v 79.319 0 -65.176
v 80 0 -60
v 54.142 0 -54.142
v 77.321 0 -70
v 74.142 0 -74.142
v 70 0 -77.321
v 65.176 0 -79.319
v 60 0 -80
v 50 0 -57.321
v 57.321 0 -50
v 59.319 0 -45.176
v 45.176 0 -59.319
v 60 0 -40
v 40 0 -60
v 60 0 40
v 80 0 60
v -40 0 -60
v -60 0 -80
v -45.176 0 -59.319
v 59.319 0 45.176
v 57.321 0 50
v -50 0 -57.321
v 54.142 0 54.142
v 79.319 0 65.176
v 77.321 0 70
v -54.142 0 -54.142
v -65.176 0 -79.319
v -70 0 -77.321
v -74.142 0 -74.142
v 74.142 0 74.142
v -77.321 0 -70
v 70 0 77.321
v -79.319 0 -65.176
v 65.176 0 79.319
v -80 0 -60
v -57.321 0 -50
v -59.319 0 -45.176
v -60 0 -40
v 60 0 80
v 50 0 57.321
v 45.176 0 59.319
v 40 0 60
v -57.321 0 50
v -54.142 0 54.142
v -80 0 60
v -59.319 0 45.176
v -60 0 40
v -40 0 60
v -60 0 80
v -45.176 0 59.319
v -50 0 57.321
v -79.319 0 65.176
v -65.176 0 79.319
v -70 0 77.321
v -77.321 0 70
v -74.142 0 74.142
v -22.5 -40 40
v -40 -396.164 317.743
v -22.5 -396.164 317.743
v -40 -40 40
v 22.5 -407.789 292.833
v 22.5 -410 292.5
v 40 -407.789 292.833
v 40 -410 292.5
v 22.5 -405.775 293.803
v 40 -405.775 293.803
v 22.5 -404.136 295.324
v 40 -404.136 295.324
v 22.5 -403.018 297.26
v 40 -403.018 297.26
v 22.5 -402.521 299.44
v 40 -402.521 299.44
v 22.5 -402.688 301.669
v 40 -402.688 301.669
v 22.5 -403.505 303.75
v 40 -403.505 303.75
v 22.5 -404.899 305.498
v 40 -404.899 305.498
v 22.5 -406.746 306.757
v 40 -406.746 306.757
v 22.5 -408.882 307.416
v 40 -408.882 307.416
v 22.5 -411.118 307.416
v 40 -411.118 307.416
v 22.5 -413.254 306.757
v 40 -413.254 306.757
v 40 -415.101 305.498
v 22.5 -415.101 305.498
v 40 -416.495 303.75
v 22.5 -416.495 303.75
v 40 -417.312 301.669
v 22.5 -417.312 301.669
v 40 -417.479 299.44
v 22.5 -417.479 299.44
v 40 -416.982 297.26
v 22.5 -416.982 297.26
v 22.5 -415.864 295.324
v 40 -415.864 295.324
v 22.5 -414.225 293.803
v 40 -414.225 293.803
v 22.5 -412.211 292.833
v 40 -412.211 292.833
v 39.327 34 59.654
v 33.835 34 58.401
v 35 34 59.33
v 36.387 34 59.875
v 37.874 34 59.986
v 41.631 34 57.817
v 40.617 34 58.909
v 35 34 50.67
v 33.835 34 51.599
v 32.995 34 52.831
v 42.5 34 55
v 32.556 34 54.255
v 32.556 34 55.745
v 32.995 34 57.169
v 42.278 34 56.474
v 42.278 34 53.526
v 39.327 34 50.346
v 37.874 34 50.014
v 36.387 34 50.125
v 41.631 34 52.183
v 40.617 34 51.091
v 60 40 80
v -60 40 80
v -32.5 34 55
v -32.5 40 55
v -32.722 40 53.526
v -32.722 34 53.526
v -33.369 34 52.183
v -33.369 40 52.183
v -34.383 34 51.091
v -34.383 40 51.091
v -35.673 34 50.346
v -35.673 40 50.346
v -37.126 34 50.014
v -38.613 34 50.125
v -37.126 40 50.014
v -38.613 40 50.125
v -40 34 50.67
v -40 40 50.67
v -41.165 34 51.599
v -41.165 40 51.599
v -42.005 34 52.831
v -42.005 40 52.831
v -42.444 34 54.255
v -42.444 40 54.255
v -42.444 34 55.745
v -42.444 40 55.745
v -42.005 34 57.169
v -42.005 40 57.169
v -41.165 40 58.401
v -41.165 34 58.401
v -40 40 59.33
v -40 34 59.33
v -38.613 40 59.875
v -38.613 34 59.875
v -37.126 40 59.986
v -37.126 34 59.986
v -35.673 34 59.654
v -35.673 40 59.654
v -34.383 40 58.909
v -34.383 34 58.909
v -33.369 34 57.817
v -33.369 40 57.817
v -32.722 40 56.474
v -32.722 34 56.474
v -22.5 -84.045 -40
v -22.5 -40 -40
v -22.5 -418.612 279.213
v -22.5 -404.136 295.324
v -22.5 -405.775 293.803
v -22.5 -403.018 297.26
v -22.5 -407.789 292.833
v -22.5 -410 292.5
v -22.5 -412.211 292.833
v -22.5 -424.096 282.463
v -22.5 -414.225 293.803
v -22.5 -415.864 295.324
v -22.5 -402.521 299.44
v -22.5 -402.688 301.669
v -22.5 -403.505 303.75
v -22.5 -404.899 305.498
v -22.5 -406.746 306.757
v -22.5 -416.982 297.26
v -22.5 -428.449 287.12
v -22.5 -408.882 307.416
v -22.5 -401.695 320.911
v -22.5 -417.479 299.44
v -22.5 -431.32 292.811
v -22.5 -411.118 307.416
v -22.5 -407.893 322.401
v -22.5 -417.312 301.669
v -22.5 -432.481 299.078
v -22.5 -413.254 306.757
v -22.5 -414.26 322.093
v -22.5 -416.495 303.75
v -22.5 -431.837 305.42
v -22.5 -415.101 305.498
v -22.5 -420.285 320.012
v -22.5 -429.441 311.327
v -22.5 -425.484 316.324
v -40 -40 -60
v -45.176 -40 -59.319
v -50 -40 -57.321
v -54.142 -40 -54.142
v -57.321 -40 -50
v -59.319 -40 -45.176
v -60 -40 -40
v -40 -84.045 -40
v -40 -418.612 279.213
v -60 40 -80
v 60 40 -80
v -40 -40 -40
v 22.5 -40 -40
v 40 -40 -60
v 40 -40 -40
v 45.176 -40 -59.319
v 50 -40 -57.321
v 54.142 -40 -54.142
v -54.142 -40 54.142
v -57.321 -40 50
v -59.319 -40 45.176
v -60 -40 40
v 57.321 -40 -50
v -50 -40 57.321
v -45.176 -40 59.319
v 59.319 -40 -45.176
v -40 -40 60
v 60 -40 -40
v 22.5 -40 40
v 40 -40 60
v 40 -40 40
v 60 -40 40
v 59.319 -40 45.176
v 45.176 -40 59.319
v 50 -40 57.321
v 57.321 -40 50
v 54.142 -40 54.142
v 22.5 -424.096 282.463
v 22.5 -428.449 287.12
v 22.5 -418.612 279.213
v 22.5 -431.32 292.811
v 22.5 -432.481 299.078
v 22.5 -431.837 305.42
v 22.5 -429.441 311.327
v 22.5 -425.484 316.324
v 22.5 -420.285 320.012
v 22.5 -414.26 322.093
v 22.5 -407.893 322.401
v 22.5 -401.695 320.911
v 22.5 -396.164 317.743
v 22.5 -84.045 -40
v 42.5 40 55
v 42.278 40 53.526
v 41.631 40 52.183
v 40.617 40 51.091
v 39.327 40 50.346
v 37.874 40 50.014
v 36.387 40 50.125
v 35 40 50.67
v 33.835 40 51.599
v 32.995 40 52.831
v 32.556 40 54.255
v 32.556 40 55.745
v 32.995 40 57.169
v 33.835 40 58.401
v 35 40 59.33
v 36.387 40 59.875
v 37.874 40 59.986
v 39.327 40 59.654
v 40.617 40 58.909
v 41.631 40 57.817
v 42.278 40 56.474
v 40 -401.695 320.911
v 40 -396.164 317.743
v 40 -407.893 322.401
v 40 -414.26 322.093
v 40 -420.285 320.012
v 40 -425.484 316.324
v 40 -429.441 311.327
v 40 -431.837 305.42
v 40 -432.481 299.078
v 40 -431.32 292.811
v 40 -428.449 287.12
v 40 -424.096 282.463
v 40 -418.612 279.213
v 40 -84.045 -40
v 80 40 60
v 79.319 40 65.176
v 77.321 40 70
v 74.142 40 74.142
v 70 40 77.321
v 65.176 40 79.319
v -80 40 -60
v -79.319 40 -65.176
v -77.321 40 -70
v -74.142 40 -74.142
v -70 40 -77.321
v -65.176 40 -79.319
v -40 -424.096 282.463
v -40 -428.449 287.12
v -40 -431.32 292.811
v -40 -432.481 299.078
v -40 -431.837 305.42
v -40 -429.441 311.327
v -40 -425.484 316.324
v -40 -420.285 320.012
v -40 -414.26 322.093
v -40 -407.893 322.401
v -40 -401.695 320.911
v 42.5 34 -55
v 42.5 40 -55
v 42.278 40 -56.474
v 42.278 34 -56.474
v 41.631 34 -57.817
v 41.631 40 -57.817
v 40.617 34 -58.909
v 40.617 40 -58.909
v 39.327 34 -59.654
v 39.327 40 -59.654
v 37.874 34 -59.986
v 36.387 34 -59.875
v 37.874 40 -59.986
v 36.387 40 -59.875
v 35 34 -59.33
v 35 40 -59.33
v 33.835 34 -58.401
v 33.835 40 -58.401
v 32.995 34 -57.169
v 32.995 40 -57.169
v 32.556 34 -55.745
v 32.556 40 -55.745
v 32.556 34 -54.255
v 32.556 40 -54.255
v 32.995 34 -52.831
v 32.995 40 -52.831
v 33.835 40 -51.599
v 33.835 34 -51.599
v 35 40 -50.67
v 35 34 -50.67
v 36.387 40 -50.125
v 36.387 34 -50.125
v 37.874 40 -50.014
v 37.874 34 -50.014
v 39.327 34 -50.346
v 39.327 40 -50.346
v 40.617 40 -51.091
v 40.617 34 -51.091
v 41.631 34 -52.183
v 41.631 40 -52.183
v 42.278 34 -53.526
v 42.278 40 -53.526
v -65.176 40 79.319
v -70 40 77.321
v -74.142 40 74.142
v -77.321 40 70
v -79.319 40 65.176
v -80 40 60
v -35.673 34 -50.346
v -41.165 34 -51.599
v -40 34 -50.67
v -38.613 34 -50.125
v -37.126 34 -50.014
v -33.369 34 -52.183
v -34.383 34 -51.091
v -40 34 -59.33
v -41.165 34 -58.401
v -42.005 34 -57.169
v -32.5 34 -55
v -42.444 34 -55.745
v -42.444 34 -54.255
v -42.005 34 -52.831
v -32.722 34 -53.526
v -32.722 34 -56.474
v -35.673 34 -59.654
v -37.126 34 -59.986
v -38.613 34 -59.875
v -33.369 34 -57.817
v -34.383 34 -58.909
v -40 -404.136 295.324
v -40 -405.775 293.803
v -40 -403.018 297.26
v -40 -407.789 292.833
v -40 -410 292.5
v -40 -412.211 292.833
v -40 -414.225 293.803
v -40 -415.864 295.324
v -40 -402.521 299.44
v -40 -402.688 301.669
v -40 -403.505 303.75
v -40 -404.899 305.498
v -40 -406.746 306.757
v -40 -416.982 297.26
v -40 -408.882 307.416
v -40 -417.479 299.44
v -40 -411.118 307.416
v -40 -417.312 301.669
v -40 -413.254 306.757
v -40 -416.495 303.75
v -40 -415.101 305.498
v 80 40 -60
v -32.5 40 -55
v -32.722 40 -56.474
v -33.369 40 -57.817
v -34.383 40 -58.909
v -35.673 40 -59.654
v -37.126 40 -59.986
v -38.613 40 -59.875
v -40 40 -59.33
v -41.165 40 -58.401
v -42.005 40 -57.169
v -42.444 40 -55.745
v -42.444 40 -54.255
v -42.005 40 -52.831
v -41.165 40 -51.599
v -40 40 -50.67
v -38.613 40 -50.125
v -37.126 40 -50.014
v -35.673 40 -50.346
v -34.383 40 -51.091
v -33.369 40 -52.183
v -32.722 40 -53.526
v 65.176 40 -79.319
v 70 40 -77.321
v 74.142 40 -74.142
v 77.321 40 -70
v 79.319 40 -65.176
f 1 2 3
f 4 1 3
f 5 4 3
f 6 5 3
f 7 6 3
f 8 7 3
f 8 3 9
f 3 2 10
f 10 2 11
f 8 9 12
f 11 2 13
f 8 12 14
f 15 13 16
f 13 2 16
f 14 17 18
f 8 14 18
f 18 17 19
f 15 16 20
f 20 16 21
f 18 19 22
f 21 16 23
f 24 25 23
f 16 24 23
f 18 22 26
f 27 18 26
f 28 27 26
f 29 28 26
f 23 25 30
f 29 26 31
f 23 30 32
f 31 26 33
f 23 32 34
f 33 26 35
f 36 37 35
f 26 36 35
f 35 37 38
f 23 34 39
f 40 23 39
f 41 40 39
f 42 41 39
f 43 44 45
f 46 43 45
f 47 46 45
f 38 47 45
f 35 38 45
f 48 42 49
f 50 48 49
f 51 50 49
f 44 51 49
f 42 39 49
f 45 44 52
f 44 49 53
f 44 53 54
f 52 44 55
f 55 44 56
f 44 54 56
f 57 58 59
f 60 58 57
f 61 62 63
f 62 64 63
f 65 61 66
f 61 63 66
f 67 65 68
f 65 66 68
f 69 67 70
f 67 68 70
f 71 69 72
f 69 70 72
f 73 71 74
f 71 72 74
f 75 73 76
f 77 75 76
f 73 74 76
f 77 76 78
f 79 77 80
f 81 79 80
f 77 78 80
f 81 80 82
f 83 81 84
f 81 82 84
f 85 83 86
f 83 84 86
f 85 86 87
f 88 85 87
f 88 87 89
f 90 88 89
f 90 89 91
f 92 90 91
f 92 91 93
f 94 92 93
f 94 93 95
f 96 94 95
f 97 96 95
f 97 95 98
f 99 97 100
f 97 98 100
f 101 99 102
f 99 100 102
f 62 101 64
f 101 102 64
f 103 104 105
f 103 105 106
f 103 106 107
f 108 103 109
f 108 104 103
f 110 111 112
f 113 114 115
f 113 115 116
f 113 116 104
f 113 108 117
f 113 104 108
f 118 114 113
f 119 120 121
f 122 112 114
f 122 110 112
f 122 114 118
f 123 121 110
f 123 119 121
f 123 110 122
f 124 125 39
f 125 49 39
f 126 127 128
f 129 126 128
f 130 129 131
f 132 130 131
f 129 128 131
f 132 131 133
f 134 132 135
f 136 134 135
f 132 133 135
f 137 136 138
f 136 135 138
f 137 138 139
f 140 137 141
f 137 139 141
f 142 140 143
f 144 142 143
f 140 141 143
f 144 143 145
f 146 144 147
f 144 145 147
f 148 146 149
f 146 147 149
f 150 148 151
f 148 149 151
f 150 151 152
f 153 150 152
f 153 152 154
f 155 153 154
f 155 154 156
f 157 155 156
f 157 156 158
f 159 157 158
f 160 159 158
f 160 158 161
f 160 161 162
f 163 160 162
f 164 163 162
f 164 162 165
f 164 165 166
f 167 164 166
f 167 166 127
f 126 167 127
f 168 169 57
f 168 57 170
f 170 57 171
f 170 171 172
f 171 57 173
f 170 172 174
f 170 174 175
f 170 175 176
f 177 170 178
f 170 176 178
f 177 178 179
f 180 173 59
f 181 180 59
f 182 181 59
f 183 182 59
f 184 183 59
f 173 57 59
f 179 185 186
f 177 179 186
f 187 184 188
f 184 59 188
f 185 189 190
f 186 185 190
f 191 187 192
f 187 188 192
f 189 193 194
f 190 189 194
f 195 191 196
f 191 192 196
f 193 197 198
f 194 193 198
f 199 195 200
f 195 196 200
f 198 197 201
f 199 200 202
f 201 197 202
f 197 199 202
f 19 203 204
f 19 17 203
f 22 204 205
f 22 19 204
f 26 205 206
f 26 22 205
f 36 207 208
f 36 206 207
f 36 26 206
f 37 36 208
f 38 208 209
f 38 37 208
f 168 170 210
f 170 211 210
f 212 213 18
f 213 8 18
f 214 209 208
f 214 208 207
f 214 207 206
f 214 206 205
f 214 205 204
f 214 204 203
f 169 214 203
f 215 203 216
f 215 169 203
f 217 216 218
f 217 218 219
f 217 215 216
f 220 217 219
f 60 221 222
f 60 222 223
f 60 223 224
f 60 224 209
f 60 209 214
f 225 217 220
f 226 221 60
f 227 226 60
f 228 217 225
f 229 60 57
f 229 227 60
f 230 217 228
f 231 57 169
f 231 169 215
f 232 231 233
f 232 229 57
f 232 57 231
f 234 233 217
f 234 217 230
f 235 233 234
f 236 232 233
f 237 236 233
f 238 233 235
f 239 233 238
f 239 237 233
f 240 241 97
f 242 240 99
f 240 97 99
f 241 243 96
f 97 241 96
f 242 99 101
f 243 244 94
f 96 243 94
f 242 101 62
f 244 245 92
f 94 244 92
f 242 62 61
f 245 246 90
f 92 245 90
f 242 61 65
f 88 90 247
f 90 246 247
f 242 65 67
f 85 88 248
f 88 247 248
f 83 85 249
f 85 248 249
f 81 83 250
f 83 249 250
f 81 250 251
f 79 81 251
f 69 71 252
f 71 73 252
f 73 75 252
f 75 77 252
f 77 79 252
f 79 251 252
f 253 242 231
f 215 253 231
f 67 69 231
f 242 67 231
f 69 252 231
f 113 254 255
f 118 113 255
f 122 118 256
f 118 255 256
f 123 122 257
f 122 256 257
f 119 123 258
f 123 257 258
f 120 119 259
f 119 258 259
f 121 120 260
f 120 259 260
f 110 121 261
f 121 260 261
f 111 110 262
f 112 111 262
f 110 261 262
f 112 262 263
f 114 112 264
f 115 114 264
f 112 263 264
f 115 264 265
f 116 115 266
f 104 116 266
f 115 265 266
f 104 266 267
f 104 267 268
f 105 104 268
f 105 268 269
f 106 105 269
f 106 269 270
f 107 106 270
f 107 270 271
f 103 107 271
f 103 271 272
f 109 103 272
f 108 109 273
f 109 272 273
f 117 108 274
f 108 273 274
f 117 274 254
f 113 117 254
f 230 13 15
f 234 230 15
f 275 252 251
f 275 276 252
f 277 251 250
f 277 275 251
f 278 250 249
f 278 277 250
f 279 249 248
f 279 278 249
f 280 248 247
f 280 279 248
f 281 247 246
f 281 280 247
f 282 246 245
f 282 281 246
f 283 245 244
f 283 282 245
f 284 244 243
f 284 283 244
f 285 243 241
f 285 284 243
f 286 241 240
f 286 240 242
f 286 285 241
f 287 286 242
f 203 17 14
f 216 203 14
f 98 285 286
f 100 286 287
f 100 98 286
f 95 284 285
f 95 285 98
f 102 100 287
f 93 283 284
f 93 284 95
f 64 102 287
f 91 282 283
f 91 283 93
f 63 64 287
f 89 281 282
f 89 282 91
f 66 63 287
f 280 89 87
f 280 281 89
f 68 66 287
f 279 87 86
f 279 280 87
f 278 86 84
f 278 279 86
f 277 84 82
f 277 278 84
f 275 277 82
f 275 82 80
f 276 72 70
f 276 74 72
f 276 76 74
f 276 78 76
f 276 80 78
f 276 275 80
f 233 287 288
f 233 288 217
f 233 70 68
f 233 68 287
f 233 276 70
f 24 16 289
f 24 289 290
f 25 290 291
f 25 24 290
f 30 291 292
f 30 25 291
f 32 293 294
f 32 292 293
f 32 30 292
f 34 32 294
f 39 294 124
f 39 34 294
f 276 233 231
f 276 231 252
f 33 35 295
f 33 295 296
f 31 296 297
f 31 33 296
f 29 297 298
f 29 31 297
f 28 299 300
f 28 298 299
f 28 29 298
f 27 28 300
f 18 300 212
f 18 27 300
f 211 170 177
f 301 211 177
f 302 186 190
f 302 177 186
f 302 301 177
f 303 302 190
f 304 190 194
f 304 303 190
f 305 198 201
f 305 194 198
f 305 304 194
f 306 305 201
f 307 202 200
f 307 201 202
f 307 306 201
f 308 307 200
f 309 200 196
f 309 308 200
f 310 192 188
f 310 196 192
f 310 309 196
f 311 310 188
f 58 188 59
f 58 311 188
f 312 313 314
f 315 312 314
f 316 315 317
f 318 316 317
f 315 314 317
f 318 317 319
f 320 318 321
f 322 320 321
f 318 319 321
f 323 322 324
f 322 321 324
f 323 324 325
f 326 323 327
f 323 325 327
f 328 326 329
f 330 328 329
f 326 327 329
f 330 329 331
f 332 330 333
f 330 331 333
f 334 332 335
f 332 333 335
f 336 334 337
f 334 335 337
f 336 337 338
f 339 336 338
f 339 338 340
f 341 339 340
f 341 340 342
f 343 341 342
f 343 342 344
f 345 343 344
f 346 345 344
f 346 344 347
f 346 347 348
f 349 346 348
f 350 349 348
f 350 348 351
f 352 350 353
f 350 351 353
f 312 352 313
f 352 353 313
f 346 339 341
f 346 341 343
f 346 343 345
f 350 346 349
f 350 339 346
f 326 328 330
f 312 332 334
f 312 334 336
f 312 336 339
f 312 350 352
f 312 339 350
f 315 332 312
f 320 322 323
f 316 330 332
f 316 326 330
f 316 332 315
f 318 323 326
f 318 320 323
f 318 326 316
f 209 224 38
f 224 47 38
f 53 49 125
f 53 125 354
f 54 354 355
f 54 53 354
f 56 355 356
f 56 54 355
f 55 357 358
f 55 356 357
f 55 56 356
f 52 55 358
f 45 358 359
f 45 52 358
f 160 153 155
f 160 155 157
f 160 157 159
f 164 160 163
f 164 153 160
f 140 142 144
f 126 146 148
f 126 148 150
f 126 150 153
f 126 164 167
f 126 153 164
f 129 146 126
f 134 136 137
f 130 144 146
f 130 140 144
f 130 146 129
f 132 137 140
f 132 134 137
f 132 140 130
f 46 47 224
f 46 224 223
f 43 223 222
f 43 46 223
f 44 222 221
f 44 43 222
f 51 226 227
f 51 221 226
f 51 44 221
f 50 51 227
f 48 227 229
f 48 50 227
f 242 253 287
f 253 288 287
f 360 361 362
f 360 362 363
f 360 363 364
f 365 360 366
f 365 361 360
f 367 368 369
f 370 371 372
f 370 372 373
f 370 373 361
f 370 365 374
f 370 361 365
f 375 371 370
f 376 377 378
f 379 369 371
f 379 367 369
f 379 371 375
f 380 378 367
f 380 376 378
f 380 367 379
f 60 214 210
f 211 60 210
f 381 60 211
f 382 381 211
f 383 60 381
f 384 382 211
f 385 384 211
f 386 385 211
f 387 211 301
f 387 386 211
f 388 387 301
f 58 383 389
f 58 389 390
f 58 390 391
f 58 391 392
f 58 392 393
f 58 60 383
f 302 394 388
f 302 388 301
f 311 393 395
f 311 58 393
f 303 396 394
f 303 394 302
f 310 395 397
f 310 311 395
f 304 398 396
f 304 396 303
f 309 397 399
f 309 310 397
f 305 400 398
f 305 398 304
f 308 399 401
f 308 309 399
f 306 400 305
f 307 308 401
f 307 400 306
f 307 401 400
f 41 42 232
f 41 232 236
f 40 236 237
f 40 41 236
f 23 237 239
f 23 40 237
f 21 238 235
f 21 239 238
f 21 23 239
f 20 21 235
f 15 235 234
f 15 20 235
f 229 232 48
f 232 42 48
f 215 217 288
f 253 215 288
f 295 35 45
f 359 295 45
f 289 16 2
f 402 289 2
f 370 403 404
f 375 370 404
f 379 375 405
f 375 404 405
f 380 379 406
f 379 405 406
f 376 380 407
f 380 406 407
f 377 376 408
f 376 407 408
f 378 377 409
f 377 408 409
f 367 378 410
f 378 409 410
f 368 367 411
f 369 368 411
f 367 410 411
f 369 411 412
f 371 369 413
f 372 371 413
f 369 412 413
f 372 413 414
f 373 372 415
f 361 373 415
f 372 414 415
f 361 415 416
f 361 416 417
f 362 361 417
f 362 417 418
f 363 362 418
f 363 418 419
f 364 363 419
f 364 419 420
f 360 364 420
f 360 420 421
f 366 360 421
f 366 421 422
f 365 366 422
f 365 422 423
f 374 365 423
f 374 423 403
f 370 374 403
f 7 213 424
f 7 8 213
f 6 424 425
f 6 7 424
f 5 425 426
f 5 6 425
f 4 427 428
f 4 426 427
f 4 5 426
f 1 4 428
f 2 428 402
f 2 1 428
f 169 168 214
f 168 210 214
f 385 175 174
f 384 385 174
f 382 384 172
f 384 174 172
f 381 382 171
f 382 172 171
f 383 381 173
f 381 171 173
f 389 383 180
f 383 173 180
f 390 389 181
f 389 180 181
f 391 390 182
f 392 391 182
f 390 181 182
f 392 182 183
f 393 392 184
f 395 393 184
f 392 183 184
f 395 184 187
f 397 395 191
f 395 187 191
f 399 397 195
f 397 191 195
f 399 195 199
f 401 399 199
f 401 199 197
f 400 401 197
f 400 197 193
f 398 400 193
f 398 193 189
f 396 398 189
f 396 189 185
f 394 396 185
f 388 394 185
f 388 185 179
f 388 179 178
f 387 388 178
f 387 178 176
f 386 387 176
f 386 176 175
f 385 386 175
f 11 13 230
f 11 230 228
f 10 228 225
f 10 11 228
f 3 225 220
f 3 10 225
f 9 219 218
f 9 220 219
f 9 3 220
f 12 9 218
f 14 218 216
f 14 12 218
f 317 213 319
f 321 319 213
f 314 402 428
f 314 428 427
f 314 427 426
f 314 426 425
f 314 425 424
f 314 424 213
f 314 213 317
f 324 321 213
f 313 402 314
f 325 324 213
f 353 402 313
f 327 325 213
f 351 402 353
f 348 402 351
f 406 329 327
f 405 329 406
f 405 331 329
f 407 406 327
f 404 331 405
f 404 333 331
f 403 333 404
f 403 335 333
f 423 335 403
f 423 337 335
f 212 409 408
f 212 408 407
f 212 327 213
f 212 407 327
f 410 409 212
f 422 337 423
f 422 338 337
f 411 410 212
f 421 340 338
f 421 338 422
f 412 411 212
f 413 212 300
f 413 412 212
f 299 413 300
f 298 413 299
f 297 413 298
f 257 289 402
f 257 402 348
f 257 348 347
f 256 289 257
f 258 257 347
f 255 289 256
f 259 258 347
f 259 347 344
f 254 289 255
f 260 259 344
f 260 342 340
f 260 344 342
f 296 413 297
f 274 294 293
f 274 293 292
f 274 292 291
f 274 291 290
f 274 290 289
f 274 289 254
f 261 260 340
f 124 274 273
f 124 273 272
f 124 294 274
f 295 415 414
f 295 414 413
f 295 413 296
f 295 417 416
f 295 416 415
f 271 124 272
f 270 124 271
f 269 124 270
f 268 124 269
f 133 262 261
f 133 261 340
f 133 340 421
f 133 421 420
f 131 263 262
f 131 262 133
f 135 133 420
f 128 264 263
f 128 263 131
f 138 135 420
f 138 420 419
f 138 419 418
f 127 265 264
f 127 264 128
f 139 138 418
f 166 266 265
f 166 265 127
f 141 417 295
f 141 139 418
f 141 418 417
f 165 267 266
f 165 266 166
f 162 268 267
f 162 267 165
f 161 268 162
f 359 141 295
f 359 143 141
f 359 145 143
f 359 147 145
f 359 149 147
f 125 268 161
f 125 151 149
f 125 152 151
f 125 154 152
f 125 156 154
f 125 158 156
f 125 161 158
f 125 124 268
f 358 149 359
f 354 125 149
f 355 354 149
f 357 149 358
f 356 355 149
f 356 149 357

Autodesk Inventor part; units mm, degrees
ref_plane "XZ Plane" through (0, 0, 0) normal (0, 1, 0) x (-1, 0, 0)
ref_plane "XY Plane" through (0, 0, 0) normal (0, 0, 1) x (1, 0, 0)
sketch "Sketch1" plane through (0, 0, 0) normal (0, 1, 0) x (-1, 0, 0)
  line L0 (-60, -80) -> (60, -80)
  line L1 (80, -60) -> (80, 60)
  line L2 (60, 80) -> (-60, 80)
  line L3 (-80, 60) -> (-80, -60)
  line L4 (-80, -80) -> (80, 80) construction
  line L5 (80, -80) -> (-80, 80) construction
  arc A0 (80, 60) -> (60, 80) centre (60, 60) ccw
  arc A1 (-60, 80) -> (-80, 60) centre (-60, 60) ccw
  arc A2 (-80, -60) -> (-60, -80) centre (-60, -60) ccw
  arc A3 (60, -80) -> (80, -60) centre (60, -60) ccw
  point P0 (0, 0)
  dimension "d0" = 160
  dimension "d1" = 160
  dimension "d2" = 20
extrude "Extrusion1" add sketch "Sketch1" along normal blind 40
sketch "Sketch2" plane through (0, 0, 0) normal (0, -1, 0) x (1, 0, 0)
  line L0 (-55, -52.5) -> (55, 52.5) construction
  line L1 (55, -52.5) -> (-55, 52.5) construction
  line L2 (90.8825, 0) -> (-87.3629, 0)
  line L3 (0, 94.4084) -> (0, -106.3516)
  line L4 (-40, -60) -> (40, -60)
  line L5 (60, -40) -> (60, 40)
  line L6 (40, 60) -> (-40, 60)
  line L7 (-60, 40) -> (-60, -40)
  line L8 (-60, -60) -> (60, 60) construction
  line L9 (60, -60) -> (-60, 60) construction
  line L10 (60, 60) -> (41.9971, 60)
  line L11 (60, -60) -> (41.9971, -60)
  line L12 (60, 60) -> (60, 71.6594)
  line L13 (60, -60) -> (60, -69.6689)
  arc A0 (60, 40) -> (40, 60) centre (40, 40) ccw
  arc A1 (-40, 60) -> (-60, 40) centre (-40, 40) ccw
  arc A2 (-60, -40) -> (-40, -60) centre (-40, -40) ccw
  arc A3 (40, -60) -> (60, -40) centre (40, -40) ccw
  point P0 (0, 0)
  dimension "d23" = 60
  dimension "d25" = 60
  dimension "d26" = 20
extrude "Extrusion2" add sketch "Sketch2" along normal blind 40
sketch "Sketch3" plane through (0, 40, 0) normal (0, 1, 0) x (1, 0, 0)
  circle A0 centre (-37.5, -55) radius 5
  circle A1 centre (37.5, -55) radius 5
  line L0 (-35.6722, 52.5) -> (-19.5402, 52.5)
  line L1 (0, 83.5001) -> (0, -85.7722)
  line L2 (-75.2069, 0) -> (80.66, 0)
  line L3 (-37.5, -55) -> (37.5, -55)
  line L4 (-37.5, -55) -> (-37.5, -56.2391)
  line L5 (37.5, -55) -> (37.5, -56.2391)
  circle A2 centre (-37.5, 55) radius 5
  circle A3 centre (37.5, 55) radius 5
  point P0 (0, 0)
  dimension "d15" = 37.5
  dimension "d16" = 37.5
  dimension "d17" = 55
  dimension "d20" = 10
  dimension "d21" = 10
extrude "Extrusion3" cut sketch "Sketch3" against normal blind 6
ref_plane "Work Plane1" through (40, 0, 0) normal (1, 0, 0) x (0, 1, 0)
sketch "Sketch4" plane through (40, 0, 0) normal (1, 0, 0) x (0, 1, 0)
  arc A0 (-396.1638, 317.7429) -> (-418.612, 279.2134) centre (-410, 300) ccw
  circle A1 centre (-410, 300) radius 300
  line L0 (-40, -40) -> (-40, 40) projected
  line L1 (40, 60) -> (40, -60) projected
  line L2 (63.9503, 0) -> (-247.3631, 0)
  line L3 (-410, 300) -> (-214.4005, 300)
  line L4 (-40, -40) -> (-84.0453, -40)
  line L5 (-40, 40) -> (-40, -40)
  line L6 (-40, 40) -> (-396.1638, 317.7429)
  line L7 (-84.0453, -40) -> (-418.612, 279.2134)
  point P0 (0, 0)
  point P1 (-131.6551, 40.5657)
  dimension "d28" = 45
  dimension "d29" = 600
  dimension "d30" = 450
  dimension "d31" = 300
extrude "Extrusion4" add sketch "Sketch4" against normal blind 17.5 contours L6 A1 L7 A0 | A1 L6 L0 L2 L7 | L2 L0 L4 L7 picked at (-333.3289, 219.1483)
mirror "Mirror1" about plane through (0, 0, 0) normal (1, 0, 0) of "Extrusion4"
sketch "Sketch5" plane through (60, 0, 40) normal (1, 0, 0) x (0, 0, -1)
  arc A0 (-277.7429, -396.1638) -> (-239.2134, -418.612) centre (-260, -410) ccw projected
  circle A1 centre (-260, -410) radius 7.5
  point P0 (40, 0)
  dimension "d35" = 15
extrude "Extrusion5" cut sketch "Sketch5" against normal through all
properties part number "Plate2" material "Polyethylene, High Density"
